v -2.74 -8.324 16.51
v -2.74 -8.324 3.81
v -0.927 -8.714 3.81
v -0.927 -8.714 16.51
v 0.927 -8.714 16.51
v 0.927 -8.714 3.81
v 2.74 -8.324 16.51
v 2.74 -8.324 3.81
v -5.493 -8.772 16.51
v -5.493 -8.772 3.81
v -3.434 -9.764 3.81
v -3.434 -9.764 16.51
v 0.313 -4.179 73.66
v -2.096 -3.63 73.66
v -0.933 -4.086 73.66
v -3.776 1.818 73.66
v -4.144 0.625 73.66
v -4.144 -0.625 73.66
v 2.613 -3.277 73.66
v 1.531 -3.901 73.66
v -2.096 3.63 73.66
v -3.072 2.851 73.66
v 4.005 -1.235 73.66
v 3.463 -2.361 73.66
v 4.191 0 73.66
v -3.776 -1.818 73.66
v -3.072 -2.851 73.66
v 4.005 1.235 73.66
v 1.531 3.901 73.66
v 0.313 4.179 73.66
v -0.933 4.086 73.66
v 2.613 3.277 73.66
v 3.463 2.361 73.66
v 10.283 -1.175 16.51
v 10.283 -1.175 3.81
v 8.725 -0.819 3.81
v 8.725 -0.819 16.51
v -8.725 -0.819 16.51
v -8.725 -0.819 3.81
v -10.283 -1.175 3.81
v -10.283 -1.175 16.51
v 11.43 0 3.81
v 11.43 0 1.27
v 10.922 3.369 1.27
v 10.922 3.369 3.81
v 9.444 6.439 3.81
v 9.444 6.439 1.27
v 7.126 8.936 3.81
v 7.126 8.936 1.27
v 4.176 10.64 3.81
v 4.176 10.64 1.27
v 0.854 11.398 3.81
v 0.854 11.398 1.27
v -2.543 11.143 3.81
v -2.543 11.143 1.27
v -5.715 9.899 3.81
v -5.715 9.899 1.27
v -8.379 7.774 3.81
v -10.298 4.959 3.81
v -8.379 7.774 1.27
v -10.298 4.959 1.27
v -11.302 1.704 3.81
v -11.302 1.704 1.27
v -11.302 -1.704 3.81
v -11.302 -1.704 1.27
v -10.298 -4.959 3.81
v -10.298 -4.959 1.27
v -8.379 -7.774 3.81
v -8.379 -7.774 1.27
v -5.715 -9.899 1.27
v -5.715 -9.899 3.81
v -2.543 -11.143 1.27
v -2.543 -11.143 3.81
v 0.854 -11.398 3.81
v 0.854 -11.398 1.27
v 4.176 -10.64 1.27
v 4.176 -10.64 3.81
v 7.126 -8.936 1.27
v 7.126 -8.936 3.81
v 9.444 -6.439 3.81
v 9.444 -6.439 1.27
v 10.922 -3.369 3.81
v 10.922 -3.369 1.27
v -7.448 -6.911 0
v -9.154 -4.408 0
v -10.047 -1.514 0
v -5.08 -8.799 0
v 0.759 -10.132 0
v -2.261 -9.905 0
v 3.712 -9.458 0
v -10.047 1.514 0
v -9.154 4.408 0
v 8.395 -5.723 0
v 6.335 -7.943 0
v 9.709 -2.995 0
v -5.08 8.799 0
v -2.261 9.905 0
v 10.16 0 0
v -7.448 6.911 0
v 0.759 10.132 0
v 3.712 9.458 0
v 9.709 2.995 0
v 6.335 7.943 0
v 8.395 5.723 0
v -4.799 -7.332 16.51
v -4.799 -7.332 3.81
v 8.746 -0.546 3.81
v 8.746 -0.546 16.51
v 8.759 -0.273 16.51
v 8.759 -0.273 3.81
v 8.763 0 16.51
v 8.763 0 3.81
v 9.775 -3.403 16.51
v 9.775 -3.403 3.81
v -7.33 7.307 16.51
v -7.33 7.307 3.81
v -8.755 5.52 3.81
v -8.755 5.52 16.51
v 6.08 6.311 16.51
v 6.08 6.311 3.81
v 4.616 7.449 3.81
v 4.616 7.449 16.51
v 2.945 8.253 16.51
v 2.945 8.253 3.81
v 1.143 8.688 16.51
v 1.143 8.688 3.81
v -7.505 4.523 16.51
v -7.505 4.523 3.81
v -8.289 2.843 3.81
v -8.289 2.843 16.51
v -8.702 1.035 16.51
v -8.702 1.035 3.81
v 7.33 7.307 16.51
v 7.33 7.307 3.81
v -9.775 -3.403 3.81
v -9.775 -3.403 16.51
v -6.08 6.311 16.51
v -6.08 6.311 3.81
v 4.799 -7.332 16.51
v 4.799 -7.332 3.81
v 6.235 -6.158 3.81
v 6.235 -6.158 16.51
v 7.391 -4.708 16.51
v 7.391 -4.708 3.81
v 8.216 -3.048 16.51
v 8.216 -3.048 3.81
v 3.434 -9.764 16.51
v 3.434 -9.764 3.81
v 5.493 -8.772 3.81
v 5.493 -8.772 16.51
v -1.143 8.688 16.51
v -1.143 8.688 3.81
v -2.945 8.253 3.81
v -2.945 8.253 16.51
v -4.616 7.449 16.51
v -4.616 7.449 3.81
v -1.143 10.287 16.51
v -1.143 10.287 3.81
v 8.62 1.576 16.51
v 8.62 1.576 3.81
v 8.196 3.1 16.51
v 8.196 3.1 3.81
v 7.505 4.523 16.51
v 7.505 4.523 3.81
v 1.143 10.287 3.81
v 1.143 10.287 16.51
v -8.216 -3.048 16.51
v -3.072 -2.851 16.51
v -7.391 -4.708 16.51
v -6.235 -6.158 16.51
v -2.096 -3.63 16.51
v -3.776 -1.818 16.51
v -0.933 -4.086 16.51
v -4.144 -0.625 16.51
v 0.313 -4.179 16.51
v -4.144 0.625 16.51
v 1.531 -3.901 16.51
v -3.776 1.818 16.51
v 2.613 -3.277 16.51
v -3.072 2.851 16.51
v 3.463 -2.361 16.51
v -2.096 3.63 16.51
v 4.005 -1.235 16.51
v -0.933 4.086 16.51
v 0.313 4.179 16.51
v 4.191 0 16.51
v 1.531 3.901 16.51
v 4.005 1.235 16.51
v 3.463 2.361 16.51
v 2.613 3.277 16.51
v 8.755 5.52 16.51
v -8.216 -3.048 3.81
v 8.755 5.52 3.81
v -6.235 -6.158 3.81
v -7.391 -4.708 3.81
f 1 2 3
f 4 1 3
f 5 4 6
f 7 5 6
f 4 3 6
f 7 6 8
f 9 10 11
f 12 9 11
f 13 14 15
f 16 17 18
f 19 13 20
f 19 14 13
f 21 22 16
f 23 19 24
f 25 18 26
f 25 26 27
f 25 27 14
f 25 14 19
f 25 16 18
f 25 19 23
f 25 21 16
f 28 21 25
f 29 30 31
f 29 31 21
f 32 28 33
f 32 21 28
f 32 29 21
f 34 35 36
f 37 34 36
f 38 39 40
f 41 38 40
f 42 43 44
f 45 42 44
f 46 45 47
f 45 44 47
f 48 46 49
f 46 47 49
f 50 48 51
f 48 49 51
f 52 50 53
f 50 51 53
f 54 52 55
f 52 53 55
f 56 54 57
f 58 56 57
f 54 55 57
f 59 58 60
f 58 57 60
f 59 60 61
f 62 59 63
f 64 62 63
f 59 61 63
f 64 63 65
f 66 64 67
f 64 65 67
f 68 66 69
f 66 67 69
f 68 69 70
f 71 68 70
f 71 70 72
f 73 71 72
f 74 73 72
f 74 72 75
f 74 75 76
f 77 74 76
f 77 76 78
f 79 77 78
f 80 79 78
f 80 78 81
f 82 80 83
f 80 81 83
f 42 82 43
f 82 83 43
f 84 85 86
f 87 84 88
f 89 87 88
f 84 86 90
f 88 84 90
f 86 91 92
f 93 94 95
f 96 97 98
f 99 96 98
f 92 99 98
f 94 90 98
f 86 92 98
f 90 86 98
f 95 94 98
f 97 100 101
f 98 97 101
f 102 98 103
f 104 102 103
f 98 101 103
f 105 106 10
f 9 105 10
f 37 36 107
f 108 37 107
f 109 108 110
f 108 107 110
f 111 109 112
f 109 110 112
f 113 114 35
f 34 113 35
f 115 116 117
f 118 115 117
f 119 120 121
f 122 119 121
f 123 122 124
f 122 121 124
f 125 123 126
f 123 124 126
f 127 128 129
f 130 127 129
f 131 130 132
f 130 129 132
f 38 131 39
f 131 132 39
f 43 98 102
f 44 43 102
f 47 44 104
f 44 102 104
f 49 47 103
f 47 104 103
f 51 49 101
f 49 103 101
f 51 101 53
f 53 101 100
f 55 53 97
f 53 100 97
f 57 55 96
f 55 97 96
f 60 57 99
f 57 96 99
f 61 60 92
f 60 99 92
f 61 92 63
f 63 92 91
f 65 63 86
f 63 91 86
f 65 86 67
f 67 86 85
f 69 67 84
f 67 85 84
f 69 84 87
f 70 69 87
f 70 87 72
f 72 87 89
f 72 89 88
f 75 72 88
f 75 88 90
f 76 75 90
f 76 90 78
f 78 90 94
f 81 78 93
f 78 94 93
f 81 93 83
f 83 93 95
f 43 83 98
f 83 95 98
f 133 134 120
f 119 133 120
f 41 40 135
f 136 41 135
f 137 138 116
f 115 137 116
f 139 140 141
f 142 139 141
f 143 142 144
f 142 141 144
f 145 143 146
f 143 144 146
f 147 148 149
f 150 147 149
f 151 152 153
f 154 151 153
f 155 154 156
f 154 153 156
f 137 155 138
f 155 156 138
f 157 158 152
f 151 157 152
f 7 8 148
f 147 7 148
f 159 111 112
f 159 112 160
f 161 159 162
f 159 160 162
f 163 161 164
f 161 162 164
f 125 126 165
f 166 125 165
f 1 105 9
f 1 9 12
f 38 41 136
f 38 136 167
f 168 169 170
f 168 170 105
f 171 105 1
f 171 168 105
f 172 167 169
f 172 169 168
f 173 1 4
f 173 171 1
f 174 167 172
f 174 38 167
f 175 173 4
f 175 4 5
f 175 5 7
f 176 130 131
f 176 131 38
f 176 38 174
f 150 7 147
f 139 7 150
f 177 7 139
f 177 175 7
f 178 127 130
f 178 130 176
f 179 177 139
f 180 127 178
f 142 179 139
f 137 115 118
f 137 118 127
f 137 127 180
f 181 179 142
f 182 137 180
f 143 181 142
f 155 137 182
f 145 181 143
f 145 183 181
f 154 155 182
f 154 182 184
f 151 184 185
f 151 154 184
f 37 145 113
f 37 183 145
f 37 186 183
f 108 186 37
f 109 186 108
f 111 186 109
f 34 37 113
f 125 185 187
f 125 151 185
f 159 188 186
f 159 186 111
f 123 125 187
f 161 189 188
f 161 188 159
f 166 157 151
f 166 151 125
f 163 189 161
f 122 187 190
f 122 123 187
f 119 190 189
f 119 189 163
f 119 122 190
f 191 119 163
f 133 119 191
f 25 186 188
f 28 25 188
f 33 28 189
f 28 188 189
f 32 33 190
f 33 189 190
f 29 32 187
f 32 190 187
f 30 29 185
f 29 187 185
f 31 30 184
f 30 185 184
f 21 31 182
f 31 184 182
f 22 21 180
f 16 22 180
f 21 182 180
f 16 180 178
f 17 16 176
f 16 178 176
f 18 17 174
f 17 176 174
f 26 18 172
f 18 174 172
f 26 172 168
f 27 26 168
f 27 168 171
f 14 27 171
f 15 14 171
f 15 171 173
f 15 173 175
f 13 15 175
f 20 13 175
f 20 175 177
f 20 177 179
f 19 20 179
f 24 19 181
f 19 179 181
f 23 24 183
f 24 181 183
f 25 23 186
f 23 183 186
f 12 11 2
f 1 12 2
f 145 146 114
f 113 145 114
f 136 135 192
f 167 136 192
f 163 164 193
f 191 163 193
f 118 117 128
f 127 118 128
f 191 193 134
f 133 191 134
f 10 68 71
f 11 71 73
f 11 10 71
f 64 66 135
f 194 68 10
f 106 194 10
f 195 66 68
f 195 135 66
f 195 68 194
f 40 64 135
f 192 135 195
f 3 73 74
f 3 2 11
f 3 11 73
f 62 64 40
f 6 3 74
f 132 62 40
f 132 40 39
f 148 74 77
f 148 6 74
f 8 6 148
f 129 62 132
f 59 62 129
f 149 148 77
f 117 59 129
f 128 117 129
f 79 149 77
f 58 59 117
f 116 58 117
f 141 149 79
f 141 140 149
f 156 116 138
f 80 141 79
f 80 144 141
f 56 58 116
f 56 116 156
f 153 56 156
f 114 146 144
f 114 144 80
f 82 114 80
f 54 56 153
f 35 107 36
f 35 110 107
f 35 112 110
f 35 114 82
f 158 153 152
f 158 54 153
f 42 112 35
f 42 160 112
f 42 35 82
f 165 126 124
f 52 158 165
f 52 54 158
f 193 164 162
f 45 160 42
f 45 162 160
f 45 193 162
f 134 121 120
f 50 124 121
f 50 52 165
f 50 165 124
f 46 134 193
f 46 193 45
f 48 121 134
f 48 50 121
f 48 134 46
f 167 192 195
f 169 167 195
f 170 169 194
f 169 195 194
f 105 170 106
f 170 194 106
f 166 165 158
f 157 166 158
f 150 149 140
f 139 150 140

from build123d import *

# Parameters (mm, degrees)
F0_R     = 11.43
F1_DEPTH = 3.81
F3_DEPTH = 12.7
F4_R     = 4.191
F5_DEPTH = 57.15
F6_DEPTH = 57.15
F7_SIZE  = 1.27
F8_DEPTH = 12.7


with BuildPart() as f1:
    # F0 (on Top) → F1 (new body)
    with BuildSketch(Plane.XY):
        Circle(F0_R)
    extrude(amount=F1_DEPTH)

    # F2 (on face) → F3 (join)
    with BuildSketch(Plane.XY.offset(3.81)):
        with BuildLine():
            ThreePointArc((8.7246484395, -0.8189496979), (8.7534068589, -0.4099236057), (8.763, 0))
            ThreePointArc((8.763, 0), (8.4427240898, 2.3474622346), (7.5053076703, 4.5233312696))
            ThreePointArc((7.5053076703, 4.5233312696), (6.8511892809, 5.4636411337), (6.0800099832, 6.3105980385))
            ThreePointArc((6.0800099832, 6.3105980385), (3.8021232059, 7.8951901894), (1.143, 8.6881367393))
            ThreePointArc((1.143, 8.6881367393), (0, 8.763), (-1.143, 8.6881367393))
            ThreePointArc((-1.143, 8.6881367393), (-3.8021232059, 7.8951901894), (-6.0800099832, 6.3105980385))
            ThreePointArc((-6.0800099832, 6.3105980385), (-6.8511892809, 5.4636411337), (-7.5053076703, 4.5233312696))
            ThreePointArc((-7.5053076703, 4.5233312696), (-8.5432932944, 1.9499509443), (-8.7246484395, -0.8189496979))
            ThreePointArc((-8.7246484395, -0.8189496979), (-8.5432932944, -1.9499509443), (-8.2159655844, -3.0476349052))
            ThreePointArc((-8.2159655844, -3.0476349052), (-6.8511892809, -5.4636411337), (-4.7994486704, -7.3318116083))
            ThreePointArc((-4.7994486704, -7.3318116083), (-3.8021232059, -7.8951901894), (-2.7398338384, -8.323669836))
            ThreePointArc((-2.7398338384, -8.323669836), (0, -8.763), (2.7398338384, -8.323669836))
            ThreePointArc((2.7398338384, -8.323669836), (3.8021232059, -7.8951901894), (4.7994486704, -7.3318116083))
            ThreePointArc((4.7994486704, -7.3318116083), (6.8511892809, -5.4636411337), (8.2159655844, -3.0476349052))
            ThreePointArc((8.2159655844, -3.0476349052), (8.5432932944, -1.9499509443), (8.7246484395, -0.8189496979))
        make_face()
    extrude(amount=F3_DEPTH)

    # F4 (on face) → F5 (join)
    with BuildSketch(Plane.XY.offset(16.51)):
        Circle(F4_R)
    extrude(amount=F5_DEPTH)

    # F4 (on face) → F6 (join)
    with BuildSketch(Plane.XY.offset(16.51)):
        Circle(F4_R)
    extrude(amount=F6_DEPTH)

    # F7
    f7_edges = [f1.edges().sort_by_distance(p)[0] for p in [
        (-11.43, 0, 0),
    ]]
    chamfer(f7_edges, length=F7_SIZE)

    # F2 (on face) → F8 (join)
    with BuildSketch(Plane.XY.offset(3.81)):
        with BuildLine():
            ThreePointArc((8.7246484395, -0.8189496979), (8.7534068589, -0.4099236057), (8.763, 0))
            ThreePointArc((8.763, 0), (8.4427240898, 2.3474622346), (7.5053076703, 4.5233312696))
            ThreePointArc((7.5053076703, 4.5233312696), (6.8511892809, 5.4636411337), (6.0800099832, 6.3105980385))
            ThreePointArc((6.0800099832, 6.3105980385), (3.8021232059, 7.8951901894), (1.143, 8.6881367393))
            ThreePointArc((1.143, 8.6881367393), (0, 8.763), (-1.143, 8.6881367393))
            ThreePointArc((-1.143, 8.6881367393), (-3.8021232059, 7.8951901894), (-6.0800099832, 6.3105980385))
            ThreePointArc((-6.0800099832, 6.3105980385), (-6.8511892809, 5.4636411337), (-7.5053076703, 4.5233312696))
            ThreePointArc((-7.5053076703, 4.5233312696), (-8.5432932944, 1.9499509443), (-8.7246484395, -0.8189496979))
            ThreePointArc((-8.7246484395, -0.8189496979), (-8.5432932944, -1.9499509443), (-8.2159655844, -3.0476349052))
            ThreePointArc((-8.2159655844, -3.0476349052), (-6.8511892809, -5.4636411337), (-4.7994486704, -7.3318116083))
            ThreePointArc((-4.7994486704, -7.3318116083), (-3.8021232059, -7.8951901894), (-2.7398338384, -8.323669836))
            ThreePointArc((-2.7398338384, -8.323669836), (0, -8.763), (2.7398338384, -8.323669836))
            ThreePointArc((2.7398338384, -8.323669836), (3.8021232059, -7.8951901894), (4.7994486704, -7.3318116083))
            ThreePointArc((4.7994486704, -7.3318116083), (6.8511892809, -5.4636411337), (8.2159655844, -3.0476349052))
            ThreePointArc((8.2159655844, -3.0476349052), (8.5432932944, -1.9499509443), (8.7246484395, -0.8189496979))
        make_face()
        with BuildLine():
            ThreePointArc((6.0800099832, 6.3105980385), (6.8511892809, 5.4636411337), (7.5053076703, 4.5233312696))
            Line((7.5053076703, 4.5233312696), (8.7553493037, 5.5202062073))
            Line((8.7553493037, 5.5202062073), (7.3300516166, 7.3074729762))
            Line((7.3300516166, 7.3074729762), (6.0800099832, 6.3105980385))
        make_face()
        with BuildLine():
            Line((10.2834248601, -1.174730244), (8.7246484395, -0.8189496979))
            ThreePointArc((8.7246484395, -0.8189496979), (8.5432932944, -1.9499509443), (8.2159655844, -3.0476349052))
            Line((8.2159655844, -3.0476349052), (9.7747420051, -3.4034154512))
            Line((9.7747420051, -3.4034154512), (10.2834248601, -1.174730244))
        make_face()
        with BuildLine():
            ThreePointArc((-1.143, 8.6881367393), (0, 8.763), (1.143, 8.6881367393))
            Line((1.143, 8.6881367393), (1.143, 10.287))
            Line((1.143, 10.287), (-1.143, 10.287))
            Line((-1.143, 10.287), (-1.143, 8.6881367393))
        make_face()
        with BuildLine():
            Line((5.4931694403, -8.7723376303), (4.7994486704, -7.3318116083))
            ThreePointArc((4.7994486704, -7.3318116083), (3.8021232059, -7.8951901894), (2.7398338384, -8.323669836))
            Line((2.7398338384, -8.323669836), (3.4335546083, -9.7641958579))
            Line((3.4335546083, -9.7641958579), (5.4931694403, -8.7723376303))
        make_face()
        with BuildLine():
            ThreePointArc((-7.5053076703, 4.5233312696), (-6.8511892809, 5.4636411337), (-6.0800099832, 6.3105980385))
            Line((-6.0800099832, 6.3105980385), (-7.3300516166, 7.3074729762))
            Line((-7.3300516166, 7.3074729762), (-8.7553493037, 5.5202062073))
            Line((-8.7553493037, 5.5202062073), (-7.5053076703, 4.5233312696))
        make_face()
        with BuildLine():
            Line((-3.4335546083, -9.7641958579), (-2.7398338384, -8.323669836))
            ThreePointArc((-2.7398338384, -8.323669836), (-3.8021232059, -7.8951901894), (-4.7994486704, -7.3318116083))
            Line((-4.7994486704, -7.3318116083), (-5.4931694403, -8.7723376303))
            Line((-5.4931694403, -8.7723376303), (-3.4335546083, -9.7641958579))
        make_face()
        with BuildLine():
            ThreePointArc((-8.2159655844, -3.0476349052), (-8.5432932944, -1.9499509443), (-8.7246484395, -0.8189496979))
            Line((-8.7246484395, -0.8189496979), (-10.2834248601, -1.174730244))
            Line((-10.2834248601, -1.174730244), (-9.7747420051, -3.4034154512))
            Line((-9.7747420051, -3.4034154512), (-8.2159655844, -3.0476349052))
        make_face()
    extrude(amount=F8_DEPTH)


solid = f1.part
